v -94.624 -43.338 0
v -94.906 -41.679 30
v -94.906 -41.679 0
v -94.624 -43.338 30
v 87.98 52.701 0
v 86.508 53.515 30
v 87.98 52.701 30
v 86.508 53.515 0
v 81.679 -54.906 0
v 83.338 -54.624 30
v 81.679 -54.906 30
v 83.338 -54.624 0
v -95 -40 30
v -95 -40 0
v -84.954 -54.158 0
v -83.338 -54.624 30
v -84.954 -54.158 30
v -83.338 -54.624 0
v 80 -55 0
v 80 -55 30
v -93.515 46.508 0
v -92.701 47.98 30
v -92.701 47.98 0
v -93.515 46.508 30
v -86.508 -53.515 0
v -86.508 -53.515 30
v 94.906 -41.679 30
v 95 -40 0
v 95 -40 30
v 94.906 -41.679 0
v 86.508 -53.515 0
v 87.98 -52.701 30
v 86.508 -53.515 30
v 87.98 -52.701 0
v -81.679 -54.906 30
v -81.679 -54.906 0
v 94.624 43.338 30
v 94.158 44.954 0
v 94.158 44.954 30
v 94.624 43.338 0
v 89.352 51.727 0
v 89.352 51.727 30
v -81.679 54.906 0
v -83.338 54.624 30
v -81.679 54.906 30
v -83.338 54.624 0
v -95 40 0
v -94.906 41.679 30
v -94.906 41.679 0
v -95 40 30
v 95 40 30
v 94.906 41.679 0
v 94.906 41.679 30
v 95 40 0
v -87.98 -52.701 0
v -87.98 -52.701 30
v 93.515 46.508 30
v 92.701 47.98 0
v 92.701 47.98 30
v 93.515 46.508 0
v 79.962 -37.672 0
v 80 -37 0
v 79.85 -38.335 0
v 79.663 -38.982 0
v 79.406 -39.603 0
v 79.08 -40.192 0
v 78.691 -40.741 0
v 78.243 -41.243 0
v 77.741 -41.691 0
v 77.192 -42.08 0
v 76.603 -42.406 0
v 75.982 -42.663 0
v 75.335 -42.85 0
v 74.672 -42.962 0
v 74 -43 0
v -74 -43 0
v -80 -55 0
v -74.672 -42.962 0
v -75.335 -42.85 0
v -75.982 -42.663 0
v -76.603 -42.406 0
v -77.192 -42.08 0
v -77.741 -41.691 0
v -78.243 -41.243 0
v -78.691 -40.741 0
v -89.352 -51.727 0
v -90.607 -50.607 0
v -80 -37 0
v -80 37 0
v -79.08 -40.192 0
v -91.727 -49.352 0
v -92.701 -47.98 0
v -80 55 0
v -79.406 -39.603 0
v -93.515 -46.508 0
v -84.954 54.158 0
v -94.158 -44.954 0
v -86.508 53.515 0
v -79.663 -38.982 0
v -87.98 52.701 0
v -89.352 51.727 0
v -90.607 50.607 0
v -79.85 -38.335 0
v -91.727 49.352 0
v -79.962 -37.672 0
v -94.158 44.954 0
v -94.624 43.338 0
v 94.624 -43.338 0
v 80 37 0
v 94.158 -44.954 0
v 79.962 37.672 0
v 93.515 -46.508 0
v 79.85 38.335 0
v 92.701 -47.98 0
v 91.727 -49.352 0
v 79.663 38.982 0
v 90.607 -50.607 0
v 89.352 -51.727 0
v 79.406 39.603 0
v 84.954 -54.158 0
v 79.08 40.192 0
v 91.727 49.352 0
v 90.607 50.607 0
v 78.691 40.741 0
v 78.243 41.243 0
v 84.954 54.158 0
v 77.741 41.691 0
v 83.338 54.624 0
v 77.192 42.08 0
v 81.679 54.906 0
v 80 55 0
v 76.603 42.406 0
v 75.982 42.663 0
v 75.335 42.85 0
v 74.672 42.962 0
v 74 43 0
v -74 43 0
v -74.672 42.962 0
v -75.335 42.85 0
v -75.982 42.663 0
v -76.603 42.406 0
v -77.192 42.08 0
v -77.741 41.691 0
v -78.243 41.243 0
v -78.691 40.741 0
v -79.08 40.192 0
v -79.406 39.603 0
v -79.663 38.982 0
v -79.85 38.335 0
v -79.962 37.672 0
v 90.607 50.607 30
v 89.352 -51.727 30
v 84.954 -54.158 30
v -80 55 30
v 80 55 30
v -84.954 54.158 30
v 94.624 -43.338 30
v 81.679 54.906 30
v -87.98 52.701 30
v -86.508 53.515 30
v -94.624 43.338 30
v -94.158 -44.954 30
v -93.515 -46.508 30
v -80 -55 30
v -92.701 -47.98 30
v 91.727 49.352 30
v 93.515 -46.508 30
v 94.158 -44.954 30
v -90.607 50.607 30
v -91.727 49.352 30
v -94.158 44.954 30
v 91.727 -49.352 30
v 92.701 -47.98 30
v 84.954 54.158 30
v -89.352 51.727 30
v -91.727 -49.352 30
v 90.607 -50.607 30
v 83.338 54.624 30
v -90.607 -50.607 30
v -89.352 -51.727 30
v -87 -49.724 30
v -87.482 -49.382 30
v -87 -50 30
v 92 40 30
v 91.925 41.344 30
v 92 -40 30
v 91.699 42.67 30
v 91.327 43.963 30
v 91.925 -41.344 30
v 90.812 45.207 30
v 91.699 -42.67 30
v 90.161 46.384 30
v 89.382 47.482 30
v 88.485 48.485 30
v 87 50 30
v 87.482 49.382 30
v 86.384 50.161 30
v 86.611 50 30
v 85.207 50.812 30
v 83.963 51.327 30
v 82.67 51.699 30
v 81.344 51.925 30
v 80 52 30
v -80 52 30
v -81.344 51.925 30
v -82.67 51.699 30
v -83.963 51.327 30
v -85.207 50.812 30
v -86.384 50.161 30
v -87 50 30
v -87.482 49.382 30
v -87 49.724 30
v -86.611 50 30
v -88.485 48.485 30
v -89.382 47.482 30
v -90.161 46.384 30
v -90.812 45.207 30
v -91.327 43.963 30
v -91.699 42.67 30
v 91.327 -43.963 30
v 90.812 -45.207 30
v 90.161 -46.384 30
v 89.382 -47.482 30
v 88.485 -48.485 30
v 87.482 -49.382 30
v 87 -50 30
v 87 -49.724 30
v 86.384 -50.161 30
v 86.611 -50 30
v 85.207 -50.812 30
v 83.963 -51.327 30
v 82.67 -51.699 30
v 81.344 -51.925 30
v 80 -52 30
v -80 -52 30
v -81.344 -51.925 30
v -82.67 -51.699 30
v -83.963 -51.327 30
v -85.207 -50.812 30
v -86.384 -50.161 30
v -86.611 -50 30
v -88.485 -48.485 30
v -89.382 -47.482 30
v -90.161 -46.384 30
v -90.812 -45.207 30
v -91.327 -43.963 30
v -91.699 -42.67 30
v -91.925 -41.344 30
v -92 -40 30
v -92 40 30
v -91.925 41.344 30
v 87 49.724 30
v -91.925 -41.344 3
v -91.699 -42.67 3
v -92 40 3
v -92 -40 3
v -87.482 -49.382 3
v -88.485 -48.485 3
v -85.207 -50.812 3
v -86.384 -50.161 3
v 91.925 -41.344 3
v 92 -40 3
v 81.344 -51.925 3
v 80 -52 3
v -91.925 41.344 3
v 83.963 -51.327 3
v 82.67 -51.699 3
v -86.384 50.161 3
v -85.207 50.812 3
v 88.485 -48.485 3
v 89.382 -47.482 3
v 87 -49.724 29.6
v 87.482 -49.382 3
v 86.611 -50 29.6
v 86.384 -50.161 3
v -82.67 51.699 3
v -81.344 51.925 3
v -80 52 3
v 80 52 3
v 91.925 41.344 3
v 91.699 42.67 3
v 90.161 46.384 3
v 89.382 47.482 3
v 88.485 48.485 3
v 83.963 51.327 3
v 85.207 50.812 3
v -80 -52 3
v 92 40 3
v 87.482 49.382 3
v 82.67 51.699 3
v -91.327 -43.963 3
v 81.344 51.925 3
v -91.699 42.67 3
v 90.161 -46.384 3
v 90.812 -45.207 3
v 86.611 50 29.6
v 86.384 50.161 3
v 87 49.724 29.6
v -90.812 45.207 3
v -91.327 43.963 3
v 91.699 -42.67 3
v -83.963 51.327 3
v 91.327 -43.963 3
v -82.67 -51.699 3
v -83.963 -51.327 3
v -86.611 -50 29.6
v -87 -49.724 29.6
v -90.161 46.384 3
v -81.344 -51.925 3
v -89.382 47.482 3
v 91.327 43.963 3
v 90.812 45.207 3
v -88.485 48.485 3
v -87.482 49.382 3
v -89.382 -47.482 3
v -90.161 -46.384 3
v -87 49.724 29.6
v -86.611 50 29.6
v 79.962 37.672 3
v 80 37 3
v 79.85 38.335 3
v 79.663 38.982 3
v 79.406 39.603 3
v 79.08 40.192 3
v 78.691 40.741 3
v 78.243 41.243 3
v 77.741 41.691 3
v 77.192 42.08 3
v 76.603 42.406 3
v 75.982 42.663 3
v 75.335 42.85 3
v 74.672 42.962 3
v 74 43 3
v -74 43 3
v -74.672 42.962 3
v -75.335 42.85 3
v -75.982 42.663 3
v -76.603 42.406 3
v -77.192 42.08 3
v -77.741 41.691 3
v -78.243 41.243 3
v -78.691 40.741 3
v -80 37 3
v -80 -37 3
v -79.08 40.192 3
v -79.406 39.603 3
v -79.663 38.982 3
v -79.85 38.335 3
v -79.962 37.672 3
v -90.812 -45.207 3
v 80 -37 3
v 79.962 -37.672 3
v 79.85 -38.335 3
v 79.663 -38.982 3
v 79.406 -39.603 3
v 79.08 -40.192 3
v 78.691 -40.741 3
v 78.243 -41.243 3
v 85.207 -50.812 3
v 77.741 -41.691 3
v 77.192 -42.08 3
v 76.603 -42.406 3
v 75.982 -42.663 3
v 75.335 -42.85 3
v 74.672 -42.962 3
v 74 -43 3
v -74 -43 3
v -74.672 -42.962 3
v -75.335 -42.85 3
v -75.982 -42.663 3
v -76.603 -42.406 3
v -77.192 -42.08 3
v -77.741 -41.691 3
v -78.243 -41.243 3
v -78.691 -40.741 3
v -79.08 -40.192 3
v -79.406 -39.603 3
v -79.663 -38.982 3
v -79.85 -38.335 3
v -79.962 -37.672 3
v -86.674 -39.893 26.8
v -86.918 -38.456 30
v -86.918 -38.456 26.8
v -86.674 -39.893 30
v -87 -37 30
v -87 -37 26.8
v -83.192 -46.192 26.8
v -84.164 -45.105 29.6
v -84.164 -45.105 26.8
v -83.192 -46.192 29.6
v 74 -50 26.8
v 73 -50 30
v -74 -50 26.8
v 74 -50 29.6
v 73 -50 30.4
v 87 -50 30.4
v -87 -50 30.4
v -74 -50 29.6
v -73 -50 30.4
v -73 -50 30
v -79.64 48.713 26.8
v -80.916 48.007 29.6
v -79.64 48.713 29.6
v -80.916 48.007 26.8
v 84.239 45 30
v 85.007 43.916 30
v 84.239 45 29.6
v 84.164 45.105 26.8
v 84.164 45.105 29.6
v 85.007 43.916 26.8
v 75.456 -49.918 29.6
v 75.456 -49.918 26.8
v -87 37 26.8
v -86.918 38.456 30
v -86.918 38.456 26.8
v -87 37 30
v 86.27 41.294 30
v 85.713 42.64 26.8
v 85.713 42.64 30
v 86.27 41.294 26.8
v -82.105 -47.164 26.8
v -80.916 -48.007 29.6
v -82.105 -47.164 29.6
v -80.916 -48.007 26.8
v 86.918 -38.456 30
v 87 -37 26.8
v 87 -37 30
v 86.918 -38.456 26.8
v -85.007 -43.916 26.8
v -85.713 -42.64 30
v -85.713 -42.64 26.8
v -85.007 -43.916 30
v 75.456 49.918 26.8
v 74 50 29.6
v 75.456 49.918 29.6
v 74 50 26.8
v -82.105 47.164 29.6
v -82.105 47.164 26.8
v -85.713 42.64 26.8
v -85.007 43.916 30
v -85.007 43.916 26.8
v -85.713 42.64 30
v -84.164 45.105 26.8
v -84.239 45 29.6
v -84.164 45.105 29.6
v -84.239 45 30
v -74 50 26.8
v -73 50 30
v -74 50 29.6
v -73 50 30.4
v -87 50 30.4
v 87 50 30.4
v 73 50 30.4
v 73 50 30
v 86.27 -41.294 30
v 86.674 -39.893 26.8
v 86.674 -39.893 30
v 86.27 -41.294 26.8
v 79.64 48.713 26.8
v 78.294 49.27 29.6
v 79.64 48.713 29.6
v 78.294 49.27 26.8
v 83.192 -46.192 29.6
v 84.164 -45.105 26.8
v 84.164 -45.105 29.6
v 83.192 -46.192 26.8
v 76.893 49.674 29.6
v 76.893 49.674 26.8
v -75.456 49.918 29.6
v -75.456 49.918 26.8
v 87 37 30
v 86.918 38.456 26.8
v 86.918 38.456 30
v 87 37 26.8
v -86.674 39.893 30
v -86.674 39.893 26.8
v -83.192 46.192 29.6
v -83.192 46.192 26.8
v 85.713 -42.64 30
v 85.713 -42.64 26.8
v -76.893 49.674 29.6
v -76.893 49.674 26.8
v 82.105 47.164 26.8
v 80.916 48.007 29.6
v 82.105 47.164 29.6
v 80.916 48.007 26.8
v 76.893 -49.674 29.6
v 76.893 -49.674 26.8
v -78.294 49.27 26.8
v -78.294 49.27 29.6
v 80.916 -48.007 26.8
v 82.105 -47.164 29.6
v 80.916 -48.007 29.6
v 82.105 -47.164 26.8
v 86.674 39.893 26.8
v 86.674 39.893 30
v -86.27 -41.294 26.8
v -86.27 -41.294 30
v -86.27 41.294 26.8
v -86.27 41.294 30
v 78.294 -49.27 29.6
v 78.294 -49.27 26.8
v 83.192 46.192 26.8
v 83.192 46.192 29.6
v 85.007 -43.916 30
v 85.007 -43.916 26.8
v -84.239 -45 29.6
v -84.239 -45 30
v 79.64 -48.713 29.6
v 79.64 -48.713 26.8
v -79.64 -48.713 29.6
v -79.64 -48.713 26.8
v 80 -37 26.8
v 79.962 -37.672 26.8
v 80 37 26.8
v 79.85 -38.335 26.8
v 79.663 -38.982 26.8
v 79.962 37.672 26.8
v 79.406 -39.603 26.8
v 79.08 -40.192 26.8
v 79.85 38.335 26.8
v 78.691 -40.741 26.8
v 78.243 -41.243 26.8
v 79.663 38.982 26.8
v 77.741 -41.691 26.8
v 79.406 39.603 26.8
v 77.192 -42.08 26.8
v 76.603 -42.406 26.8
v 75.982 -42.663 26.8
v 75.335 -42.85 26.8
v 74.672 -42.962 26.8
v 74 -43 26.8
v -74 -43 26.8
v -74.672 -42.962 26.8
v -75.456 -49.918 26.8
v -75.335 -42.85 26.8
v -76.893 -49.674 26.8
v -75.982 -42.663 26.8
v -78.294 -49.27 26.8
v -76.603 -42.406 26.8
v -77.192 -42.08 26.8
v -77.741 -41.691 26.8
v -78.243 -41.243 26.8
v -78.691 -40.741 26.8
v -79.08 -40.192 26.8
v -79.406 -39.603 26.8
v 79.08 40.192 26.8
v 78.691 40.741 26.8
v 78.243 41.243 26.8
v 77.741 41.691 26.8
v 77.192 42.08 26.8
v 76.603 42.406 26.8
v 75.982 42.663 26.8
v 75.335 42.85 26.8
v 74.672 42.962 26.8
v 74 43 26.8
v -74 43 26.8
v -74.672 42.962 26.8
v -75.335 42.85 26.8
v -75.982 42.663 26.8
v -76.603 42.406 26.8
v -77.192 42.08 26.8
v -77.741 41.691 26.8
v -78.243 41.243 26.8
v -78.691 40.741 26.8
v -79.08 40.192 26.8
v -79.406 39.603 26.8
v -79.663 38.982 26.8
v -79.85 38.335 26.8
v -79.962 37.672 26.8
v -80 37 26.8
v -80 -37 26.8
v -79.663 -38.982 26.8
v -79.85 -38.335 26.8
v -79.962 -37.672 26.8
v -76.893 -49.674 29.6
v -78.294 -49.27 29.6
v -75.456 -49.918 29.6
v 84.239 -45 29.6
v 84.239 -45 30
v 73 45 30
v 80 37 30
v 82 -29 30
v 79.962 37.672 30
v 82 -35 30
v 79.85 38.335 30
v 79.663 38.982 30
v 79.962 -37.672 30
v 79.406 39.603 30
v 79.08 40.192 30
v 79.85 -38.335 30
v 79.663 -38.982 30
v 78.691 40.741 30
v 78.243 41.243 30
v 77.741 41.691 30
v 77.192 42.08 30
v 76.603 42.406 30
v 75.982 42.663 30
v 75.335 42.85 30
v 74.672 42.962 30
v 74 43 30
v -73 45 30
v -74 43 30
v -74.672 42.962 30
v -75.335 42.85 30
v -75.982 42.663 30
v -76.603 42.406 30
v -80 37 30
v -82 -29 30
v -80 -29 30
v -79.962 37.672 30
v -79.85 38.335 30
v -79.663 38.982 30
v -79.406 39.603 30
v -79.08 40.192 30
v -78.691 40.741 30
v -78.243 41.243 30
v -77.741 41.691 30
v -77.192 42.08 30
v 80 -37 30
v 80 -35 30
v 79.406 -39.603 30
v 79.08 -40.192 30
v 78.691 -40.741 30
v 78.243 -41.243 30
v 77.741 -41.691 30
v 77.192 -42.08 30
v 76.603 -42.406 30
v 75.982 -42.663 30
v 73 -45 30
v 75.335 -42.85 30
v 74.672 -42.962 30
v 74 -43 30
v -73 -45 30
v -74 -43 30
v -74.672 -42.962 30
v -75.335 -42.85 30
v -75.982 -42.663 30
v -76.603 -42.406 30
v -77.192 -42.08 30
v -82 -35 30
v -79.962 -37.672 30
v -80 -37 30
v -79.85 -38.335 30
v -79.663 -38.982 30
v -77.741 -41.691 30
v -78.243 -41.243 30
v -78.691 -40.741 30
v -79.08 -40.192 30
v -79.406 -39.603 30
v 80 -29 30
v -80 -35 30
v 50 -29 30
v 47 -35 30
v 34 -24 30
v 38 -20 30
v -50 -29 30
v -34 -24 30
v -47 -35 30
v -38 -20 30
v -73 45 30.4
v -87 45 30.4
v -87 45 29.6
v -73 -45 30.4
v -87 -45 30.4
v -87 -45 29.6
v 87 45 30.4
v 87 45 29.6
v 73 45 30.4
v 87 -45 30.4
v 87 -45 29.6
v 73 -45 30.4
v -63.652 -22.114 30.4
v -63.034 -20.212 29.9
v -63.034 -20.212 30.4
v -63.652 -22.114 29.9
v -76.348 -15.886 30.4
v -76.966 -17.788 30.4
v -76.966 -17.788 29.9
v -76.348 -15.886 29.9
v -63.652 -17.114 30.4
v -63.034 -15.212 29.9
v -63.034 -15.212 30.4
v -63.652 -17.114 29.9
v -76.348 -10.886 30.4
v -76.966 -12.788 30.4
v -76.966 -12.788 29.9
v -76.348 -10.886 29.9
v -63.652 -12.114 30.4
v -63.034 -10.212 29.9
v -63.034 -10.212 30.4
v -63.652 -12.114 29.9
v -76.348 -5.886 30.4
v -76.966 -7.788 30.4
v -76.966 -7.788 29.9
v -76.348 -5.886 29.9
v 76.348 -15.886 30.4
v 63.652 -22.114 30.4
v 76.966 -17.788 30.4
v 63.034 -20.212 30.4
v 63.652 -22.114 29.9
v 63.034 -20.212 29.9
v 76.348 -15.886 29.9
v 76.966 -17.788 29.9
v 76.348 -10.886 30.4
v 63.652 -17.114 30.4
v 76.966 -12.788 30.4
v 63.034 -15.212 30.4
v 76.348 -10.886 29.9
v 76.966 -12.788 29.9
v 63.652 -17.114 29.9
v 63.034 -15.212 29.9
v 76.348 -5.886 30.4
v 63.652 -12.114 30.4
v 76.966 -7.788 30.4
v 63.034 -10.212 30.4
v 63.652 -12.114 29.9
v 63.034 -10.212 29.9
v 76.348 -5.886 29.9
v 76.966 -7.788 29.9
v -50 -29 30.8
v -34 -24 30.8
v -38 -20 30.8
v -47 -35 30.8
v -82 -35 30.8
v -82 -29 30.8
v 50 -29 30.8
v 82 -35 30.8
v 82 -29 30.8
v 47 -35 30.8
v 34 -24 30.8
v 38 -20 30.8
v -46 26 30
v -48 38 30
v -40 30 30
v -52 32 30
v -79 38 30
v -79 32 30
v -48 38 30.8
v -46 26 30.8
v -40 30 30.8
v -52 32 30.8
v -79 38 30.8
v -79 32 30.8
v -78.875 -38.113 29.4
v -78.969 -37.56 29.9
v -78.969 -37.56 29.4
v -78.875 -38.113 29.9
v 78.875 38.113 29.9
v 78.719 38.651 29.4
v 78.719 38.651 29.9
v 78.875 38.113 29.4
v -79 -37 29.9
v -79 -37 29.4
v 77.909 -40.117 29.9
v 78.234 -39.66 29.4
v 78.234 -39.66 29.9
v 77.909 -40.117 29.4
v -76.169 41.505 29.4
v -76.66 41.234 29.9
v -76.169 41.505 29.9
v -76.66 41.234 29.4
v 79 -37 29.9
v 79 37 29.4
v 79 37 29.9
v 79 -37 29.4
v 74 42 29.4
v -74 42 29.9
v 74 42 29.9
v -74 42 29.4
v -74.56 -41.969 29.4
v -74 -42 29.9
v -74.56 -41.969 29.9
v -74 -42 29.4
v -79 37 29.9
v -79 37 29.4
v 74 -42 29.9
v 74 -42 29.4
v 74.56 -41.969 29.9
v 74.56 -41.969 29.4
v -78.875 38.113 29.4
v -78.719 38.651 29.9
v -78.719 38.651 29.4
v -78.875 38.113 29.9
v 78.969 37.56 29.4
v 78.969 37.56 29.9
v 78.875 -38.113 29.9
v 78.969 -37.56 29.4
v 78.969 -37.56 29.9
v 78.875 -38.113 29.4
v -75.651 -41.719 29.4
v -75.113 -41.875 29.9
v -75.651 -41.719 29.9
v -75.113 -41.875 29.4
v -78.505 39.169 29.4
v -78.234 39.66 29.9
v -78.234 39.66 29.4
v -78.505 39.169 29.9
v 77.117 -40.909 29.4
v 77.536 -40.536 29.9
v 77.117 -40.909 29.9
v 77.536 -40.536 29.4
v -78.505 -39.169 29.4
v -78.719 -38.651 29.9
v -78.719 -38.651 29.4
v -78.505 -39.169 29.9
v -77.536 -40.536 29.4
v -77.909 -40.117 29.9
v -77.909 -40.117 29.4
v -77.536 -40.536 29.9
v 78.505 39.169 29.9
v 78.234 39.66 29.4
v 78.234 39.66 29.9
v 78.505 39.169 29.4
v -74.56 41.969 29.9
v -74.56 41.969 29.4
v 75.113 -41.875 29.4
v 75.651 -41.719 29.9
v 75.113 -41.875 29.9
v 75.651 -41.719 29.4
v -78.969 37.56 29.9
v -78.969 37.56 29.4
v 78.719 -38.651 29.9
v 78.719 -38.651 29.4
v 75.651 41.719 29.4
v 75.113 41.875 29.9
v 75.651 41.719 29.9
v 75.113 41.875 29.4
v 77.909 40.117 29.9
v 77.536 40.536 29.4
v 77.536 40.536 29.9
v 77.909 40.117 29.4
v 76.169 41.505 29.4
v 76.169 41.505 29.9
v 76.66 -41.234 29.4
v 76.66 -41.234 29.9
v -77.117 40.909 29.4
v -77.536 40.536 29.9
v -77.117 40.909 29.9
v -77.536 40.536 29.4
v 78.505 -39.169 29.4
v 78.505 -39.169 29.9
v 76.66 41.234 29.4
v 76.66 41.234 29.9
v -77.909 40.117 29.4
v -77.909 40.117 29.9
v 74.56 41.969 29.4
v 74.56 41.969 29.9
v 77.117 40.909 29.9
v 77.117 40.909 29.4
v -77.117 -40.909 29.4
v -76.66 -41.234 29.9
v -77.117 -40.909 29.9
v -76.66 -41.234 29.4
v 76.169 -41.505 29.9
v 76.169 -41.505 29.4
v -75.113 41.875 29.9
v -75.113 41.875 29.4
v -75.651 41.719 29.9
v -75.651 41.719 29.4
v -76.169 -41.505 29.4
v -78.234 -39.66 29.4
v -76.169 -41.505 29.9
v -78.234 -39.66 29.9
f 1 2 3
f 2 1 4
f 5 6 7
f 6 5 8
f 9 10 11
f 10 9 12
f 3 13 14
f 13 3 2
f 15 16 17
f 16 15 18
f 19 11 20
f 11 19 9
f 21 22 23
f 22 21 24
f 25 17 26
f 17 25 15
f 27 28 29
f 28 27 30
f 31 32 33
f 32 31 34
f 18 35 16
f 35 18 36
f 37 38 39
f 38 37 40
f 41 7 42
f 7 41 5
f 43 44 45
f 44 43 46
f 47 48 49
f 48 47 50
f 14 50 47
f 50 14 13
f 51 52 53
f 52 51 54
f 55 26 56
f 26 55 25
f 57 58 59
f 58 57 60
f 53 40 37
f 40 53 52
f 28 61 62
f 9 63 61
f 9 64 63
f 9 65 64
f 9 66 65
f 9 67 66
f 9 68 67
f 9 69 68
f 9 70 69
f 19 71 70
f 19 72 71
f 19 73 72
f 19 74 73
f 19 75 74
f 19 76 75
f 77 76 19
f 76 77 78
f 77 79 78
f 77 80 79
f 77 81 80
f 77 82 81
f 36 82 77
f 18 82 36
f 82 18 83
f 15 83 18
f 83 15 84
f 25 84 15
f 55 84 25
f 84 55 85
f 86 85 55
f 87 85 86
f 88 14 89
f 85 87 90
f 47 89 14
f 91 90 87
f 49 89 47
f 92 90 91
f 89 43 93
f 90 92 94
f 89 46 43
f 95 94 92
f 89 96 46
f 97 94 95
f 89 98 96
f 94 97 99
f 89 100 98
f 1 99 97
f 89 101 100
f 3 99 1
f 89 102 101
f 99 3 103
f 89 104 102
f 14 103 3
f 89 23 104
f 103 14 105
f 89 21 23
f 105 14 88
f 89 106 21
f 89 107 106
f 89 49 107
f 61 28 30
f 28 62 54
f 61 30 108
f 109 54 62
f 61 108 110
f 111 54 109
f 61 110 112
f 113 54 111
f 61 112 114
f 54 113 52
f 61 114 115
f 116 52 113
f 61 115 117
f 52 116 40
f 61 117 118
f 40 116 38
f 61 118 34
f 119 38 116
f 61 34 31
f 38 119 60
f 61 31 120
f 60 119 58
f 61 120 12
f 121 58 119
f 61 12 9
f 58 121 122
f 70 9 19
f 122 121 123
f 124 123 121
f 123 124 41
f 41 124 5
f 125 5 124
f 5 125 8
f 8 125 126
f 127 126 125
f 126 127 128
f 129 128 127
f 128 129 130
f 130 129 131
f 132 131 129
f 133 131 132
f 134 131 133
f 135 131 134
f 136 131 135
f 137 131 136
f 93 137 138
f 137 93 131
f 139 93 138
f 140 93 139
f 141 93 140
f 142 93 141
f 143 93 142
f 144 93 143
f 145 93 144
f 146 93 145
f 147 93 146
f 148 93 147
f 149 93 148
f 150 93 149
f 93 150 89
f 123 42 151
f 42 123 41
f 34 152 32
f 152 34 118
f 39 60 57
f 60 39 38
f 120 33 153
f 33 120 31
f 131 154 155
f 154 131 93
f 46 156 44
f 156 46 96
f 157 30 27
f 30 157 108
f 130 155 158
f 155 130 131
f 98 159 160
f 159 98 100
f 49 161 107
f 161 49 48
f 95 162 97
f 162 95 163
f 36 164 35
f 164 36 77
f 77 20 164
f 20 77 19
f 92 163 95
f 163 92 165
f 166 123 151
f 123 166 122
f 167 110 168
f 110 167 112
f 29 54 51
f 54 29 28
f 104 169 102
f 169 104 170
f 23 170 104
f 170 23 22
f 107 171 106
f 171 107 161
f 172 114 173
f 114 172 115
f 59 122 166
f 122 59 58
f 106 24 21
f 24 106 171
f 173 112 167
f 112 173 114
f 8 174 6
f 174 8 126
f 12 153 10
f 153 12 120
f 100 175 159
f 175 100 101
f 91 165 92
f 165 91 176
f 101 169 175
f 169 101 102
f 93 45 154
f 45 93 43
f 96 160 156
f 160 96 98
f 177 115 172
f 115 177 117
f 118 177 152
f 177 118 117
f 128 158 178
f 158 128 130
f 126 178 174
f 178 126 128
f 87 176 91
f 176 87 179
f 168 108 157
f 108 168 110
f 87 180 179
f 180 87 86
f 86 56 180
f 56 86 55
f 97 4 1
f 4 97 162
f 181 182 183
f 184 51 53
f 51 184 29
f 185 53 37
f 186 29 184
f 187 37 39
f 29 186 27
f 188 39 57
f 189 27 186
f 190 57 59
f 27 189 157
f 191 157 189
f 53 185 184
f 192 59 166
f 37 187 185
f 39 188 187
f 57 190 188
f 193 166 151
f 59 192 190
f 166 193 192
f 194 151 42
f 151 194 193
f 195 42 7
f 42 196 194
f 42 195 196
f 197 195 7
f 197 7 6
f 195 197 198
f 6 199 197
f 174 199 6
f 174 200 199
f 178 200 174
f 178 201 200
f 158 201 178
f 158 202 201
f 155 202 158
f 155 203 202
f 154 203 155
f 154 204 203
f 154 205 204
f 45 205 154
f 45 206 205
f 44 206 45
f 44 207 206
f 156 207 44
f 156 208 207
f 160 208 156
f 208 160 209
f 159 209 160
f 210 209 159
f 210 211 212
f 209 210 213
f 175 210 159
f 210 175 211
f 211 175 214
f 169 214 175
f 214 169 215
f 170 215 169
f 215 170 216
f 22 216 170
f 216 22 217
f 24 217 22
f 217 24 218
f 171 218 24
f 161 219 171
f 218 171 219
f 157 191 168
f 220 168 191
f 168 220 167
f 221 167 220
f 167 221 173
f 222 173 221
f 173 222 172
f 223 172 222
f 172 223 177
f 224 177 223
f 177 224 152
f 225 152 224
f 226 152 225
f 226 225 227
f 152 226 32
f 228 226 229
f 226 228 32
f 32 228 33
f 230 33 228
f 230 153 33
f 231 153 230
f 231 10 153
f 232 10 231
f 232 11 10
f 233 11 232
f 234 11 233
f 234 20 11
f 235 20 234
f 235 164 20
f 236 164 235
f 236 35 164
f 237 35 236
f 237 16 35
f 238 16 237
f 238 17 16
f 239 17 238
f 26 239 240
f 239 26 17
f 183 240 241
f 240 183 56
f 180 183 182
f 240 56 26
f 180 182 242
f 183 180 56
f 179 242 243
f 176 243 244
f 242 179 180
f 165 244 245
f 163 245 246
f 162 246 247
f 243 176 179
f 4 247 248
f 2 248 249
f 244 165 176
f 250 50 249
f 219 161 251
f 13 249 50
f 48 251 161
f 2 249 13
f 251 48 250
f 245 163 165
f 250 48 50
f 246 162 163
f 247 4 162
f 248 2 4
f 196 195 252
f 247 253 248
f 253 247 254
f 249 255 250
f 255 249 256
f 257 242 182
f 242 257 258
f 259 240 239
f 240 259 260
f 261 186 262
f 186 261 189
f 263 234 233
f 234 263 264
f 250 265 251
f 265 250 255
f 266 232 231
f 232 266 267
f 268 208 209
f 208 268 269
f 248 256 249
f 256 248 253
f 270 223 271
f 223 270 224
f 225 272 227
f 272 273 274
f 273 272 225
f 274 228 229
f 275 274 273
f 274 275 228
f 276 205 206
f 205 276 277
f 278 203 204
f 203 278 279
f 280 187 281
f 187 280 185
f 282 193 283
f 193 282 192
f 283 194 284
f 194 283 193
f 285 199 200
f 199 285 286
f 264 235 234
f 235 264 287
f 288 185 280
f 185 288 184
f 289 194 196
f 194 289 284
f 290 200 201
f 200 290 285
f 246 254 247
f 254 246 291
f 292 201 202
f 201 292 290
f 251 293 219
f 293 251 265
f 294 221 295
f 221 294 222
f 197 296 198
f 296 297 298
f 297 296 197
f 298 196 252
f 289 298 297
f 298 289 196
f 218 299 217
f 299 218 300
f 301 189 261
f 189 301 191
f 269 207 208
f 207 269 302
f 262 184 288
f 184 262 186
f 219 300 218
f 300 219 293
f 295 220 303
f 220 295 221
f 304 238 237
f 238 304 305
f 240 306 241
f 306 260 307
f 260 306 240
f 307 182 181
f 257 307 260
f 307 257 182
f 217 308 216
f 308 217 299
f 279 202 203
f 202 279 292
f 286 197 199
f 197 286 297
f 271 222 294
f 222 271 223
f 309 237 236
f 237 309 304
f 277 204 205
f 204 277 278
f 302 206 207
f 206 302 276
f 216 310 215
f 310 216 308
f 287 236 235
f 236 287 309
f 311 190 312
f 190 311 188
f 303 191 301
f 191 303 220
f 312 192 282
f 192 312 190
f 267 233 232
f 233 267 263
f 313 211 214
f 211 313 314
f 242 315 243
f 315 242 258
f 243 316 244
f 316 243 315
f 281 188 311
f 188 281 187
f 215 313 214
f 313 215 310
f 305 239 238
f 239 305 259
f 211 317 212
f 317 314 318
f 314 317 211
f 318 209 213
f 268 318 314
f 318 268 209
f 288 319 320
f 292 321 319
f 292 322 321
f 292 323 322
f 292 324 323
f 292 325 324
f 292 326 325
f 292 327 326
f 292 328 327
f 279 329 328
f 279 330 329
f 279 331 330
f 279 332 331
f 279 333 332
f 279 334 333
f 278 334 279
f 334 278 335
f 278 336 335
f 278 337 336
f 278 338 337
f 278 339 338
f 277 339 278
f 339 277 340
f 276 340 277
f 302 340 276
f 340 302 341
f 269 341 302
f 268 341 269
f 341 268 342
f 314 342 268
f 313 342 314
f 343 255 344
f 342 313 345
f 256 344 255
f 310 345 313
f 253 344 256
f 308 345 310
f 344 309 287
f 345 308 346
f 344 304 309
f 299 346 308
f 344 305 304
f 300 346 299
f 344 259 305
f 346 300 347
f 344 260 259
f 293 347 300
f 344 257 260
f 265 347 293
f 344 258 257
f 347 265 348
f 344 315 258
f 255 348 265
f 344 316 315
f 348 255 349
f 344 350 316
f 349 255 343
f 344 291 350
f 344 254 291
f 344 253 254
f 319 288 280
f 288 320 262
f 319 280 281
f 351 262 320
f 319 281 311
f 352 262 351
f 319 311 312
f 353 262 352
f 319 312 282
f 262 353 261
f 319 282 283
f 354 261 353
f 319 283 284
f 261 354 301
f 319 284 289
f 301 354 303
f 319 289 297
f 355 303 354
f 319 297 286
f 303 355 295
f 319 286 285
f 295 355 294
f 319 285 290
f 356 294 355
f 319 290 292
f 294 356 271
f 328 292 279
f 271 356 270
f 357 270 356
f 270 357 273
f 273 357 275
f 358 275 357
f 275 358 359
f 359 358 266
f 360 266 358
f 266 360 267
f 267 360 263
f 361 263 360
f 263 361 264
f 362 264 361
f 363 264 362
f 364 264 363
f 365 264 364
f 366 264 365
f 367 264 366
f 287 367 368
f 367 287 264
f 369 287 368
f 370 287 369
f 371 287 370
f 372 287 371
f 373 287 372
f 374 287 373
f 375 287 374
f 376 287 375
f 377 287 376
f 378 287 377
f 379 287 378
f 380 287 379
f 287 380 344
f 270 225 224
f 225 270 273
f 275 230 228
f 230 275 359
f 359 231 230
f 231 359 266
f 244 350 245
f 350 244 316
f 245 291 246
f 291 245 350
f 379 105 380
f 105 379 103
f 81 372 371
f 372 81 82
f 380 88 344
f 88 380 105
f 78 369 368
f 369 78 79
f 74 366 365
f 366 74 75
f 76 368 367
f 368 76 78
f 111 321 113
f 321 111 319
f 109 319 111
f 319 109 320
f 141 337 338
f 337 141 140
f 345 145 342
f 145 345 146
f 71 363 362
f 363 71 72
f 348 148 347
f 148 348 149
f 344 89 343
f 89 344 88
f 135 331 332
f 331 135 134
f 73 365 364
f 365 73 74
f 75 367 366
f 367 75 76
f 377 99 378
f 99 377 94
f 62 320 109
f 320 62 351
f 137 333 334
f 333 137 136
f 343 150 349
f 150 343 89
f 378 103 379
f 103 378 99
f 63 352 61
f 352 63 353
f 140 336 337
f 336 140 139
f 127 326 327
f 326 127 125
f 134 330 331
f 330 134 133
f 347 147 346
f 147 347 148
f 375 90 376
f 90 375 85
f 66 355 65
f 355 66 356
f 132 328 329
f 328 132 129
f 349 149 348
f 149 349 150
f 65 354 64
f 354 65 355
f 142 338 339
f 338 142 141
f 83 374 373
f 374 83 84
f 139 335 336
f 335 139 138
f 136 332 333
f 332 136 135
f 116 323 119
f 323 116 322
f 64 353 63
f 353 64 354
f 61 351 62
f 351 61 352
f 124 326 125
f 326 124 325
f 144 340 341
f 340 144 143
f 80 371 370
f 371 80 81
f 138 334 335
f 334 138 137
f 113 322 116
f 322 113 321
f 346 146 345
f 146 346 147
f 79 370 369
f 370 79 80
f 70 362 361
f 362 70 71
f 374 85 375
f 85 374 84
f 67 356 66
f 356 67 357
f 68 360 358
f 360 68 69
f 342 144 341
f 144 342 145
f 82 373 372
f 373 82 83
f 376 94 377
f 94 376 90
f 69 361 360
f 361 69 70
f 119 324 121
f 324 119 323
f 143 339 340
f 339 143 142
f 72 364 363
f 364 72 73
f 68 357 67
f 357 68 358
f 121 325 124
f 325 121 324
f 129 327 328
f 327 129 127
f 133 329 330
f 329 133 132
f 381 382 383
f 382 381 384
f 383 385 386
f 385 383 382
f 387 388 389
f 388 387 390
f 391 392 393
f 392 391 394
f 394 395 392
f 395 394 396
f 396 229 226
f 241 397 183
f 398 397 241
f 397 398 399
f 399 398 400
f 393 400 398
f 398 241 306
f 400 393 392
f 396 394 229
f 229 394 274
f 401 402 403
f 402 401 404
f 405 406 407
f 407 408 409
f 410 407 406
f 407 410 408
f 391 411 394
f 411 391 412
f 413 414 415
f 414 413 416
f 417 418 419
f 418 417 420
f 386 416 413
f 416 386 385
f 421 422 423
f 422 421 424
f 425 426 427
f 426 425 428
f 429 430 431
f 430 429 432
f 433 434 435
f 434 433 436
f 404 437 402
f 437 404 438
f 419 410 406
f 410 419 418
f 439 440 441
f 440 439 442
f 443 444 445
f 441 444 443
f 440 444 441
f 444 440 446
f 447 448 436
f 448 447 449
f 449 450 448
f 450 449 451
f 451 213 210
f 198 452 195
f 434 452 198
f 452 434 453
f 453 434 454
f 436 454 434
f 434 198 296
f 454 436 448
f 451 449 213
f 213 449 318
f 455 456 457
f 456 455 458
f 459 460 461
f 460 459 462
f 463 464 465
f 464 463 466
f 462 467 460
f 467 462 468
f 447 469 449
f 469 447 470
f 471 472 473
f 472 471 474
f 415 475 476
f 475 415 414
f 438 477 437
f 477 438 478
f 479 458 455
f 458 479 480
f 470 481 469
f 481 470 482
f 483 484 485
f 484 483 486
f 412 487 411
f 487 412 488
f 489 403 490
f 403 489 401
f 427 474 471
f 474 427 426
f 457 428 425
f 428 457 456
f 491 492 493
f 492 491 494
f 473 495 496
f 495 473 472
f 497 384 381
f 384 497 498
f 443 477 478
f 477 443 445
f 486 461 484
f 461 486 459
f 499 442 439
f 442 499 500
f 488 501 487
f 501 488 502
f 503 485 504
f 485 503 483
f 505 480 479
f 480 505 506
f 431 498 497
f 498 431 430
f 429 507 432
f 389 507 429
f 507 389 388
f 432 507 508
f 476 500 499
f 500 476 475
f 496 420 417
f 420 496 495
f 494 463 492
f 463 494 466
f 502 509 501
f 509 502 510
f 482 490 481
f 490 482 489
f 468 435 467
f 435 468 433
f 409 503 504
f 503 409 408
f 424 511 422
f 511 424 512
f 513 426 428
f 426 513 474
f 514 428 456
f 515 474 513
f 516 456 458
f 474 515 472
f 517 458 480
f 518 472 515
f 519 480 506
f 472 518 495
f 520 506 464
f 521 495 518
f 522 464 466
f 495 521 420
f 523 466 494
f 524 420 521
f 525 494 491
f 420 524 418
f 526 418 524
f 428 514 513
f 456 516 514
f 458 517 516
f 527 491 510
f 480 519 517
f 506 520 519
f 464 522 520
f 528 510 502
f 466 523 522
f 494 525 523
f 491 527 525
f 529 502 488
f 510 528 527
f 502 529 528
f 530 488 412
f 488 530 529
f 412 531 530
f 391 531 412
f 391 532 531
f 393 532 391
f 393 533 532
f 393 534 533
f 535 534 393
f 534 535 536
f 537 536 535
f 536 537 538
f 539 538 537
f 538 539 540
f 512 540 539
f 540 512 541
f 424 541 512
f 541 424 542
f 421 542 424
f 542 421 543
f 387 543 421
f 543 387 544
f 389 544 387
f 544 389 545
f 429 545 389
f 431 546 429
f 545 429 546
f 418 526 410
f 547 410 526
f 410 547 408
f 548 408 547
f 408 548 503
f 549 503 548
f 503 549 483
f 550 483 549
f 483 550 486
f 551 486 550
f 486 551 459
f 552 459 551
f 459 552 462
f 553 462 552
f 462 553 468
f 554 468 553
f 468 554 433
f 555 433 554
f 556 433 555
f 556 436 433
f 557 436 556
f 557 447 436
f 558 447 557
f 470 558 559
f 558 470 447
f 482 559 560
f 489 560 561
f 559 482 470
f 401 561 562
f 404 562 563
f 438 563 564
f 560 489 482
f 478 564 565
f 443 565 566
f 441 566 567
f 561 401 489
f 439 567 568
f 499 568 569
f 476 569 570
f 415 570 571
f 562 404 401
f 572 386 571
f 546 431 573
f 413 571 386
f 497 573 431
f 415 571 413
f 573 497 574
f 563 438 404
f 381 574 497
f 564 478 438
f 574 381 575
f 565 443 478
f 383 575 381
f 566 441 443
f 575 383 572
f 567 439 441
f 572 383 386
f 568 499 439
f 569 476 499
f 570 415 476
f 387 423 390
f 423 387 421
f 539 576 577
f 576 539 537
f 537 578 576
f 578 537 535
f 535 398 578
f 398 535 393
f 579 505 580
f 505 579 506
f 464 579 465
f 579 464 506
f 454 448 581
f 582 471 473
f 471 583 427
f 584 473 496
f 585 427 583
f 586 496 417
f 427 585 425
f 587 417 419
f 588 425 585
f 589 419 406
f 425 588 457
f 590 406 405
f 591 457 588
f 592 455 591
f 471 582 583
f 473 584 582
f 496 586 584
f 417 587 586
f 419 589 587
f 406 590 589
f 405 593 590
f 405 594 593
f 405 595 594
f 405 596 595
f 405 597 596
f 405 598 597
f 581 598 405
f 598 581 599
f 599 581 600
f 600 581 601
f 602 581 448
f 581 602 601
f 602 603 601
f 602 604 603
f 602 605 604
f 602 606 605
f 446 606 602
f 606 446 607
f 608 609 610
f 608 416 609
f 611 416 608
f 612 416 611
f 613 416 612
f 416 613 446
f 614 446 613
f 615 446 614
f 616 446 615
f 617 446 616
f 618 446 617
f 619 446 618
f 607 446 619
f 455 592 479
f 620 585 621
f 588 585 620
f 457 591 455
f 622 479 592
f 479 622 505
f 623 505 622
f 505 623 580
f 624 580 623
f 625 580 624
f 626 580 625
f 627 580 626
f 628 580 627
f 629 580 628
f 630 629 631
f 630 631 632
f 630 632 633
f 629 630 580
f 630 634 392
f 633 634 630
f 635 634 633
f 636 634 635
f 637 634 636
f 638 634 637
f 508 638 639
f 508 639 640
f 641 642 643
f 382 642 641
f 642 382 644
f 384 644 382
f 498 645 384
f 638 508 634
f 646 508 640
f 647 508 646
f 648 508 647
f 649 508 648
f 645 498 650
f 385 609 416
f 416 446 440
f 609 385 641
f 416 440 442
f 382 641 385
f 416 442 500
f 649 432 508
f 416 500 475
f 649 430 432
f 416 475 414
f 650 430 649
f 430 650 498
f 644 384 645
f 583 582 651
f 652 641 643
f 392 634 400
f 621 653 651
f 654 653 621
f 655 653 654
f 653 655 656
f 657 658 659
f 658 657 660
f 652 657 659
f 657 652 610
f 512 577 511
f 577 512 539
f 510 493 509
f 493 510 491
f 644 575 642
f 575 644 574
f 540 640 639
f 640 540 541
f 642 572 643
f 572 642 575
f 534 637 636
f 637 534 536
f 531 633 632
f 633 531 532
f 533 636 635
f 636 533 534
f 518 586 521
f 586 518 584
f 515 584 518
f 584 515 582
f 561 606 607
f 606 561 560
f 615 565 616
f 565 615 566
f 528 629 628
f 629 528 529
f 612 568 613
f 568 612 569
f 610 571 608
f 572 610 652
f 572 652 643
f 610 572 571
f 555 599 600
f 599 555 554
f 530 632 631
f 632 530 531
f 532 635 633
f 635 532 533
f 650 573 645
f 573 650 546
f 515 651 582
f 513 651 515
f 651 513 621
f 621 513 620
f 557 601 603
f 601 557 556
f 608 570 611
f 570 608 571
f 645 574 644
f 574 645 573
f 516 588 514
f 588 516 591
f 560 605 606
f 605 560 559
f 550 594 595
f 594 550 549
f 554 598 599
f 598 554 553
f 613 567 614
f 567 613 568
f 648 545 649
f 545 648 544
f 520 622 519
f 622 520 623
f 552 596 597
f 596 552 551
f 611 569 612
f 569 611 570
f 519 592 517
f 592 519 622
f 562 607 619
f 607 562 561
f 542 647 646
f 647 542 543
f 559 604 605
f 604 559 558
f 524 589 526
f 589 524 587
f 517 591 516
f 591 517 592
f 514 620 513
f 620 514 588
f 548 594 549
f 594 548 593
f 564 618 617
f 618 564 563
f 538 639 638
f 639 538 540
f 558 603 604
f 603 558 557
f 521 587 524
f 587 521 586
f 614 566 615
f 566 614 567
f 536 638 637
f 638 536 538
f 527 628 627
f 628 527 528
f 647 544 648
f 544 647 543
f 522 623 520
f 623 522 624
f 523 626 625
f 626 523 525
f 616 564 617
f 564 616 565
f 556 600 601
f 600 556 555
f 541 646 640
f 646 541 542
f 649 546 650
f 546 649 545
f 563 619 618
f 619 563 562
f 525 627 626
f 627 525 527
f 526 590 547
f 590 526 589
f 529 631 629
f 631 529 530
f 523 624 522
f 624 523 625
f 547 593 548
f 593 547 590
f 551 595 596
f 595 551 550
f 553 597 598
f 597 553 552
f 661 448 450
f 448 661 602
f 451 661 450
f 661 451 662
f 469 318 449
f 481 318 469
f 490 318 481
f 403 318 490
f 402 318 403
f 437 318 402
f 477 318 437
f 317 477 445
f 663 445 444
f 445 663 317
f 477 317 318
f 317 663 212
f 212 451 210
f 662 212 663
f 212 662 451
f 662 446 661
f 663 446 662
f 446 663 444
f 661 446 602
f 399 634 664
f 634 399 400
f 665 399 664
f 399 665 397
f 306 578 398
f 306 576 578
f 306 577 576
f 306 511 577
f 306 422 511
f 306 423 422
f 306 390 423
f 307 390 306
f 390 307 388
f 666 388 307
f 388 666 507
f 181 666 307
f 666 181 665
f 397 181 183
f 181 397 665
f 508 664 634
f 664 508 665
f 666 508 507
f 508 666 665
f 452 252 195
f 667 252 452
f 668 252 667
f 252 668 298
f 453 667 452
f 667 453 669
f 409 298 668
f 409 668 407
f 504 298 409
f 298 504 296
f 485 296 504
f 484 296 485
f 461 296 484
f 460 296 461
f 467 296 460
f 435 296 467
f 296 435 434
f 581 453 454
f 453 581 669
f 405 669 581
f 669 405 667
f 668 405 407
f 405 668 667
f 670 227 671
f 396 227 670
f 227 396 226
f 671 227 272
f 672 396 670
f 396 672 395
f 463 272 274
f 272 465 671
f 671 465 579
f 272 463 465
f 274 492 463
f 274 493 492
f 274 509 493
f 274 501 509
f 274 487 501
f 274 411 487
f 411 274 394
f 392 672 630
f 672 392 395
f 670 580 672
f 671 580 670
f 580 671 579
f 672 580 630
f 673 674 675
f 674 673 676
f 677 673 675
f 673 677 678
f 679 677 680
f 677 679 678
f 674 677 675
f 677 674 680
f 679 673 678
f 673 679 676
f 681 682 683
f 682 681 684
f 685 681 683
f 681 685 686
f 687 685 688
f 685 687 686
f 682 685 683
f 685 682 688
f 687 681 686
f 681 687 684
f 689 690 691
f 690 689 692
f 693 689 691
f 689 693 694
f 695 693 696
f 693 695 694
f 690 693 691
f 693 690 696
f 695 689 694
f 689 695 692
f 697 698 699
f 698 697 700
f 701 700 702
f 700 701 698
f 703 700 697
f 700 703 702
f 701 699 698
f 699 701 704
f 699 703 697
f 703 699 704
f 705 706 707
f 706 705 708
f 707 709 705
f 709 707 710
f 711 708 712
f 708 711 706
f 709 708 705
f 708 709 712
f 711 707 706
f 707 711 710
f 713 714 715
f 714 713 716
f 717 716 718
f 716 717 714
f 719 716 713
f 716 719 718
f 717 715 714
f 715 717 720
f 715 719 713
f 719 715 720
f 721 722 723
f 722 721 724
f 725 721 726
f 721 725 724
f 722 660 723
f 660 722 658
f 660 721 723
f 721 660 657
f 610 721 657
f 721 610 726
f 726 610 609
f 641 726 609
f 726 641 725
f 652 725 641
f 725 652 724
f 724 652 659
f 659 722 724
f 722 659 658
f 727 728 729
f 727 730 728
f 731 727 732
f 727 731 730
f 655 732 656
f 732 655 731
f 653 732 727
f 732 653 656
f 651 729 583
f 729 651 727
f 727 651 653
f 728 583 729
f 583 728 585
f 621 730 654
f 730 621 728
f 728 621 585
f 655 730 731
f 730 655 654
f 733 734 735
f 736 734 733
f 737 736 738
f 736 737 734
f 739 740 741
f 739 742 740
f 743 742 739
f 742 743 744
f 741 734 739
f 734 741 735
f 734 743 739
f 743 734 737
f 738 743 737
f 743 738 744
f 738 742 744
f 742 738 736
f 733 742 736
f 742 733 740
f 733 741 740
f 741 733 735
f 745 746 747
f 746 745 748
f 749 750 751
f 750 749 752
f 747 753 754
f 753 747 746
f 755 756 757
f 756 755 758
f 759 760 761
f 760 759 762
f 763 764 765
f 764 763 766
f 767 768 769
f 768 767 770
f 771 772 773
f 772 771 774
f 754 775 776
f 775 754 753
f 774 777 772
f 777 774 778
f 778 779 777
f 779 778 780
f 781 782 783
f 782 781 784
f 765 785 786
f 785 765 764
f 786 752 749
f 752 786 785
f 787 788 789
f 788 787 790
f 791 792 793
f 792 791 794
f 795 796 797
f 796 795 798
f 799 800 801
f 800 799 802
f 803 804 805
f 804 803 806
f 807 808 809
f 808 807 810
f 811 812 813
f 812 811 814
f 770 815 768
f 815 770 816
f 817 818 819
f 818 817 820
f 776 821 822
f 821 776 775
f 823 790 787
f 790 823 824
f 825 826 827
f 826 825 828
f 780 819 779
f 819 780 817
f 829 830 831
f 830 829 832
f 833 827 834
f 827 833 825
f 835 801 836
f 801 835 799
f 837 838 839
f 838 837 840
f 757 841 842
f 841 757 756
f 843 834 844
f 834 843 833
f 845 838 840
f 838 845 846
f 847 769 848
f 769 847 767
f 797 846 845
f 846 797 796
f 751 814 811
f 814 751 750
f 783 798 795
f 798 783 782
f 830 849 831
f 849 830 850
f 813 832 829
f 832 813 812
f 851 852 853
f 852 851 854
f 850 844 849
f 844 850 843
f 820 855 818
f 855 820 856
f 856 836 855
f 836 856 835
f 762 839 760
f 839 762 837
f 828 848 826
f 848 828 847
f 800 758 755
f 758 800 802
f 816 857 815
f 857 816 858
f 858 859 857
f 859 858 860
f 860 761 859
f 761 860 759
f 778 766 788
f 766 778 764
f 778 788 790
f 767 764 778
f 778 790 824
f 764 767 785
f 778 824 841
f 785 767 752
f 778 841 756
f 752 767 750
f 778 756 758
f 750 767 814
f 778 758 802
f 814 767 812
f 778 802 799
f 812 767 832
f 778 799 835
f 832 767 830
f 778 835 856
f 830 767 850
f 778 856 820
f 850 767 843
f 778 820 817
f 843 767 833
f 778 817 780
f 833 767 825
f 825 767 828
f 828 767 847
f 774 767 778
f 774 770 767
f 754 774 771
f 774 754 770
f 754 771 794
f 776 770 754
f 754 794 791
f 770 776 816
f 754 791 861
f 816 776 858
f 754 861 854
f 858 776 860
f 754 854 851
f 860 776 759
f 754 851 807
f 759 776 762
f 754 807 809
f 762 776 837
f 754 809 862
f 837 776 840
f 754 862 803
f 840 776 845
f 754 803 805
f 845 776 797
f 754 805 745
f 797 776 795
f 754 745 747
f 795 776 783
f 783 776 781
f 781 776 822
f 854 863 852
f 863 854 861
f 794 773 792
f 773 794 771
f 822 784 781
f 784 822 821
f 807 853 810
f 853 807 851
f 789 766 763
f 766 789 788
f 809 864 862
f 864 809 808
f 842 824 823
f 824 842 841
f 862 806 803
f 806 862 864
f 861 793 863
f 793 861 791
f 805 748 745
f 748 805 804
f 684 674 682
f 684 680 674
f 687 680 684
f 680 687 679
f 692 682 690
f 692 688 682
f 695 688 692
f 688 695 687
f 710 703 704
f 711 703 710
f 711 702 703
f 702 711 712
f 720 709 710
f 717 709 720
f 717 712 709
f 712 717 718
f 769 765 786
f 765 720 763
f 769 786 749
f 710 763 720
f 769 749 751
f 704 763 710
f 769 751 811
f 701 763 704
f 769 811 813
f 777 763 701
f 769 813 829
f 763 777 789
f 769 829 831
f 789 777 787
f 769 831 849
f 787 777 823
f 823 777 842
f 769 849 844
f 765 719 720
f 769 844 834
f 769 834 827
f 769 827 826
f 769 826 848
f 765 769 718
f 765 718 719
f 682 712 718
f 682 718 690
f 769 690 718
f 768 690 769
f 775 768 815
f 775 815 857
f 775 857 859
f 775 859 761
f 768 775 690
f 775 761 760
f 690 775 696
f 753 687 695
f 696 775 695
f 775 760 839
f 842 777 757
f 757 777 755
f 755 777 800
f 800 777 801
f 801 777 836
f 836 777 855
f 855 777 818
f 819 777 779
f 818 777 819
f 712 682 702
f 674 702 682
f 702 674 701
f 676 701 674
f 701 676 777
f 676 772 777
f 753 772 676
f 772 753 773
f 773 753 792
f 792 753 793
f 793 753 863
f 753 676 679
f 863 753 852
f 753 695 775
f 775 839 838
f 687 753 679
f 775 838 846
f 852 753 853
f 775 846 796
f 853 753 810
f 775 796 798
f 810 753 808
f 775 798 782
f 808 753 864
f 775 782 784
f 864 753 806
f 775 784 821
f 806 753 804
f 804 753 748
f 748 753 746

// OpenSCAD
/*
  MotoMap — Cyberpunk front enclosure concept
  ------------------------------------------------
  Editable OpenSCAD starting point for a horizontal motorcycle display box.
  This file intentionally does NOT lock in the real screen, magnet, or clip
  dimensions. Edit the values in the PARAMETERS section before exporting STL.

  Suggested workflow:
    1. Open this file in OpenSCAD.
    2. Change outer dimensions and screen opening.
    3. Press F5 for preview, F6 to render, then export STL.
    4. Add the rear magnetic feet and right-side C/J clip after measuring the
       motorcycle reservoir screws and lamp stem.

  The generated object is a front-face concept, not a final road-safe mount.
*/

$fn = 56;

// ============================ PARAMETERS ============================

// Overall front housing. All units are millimetres.
box_w = 190;
box_h = 110;
box_d = 30;
corner_r = 15;
wall = 3;

// Generic 320 x 172 aspect-ratio display opening. Measure the real module.
screen_w = 160;
screen_h = 86;
screen_corner_r = 6;
bezel_w = 7;

// Cyberpunk visual relief.
faceplate_d = 3.2;
ridge_h = 0.8;
trace_w = 2.0;
accent_tab_w = 14;
accent_tab_h = 5;

// Visual switches.
show_shell = true;             // Basic rear-open body for reference.
show_cyberpunk_relief = true;  // Raised decorative traces and corner fins.
show_screen_placeholder = true;

// ============================== HELPERS =============================

module rounded_rect_2d(w, h, r) {
    rr = min(r, min(w, h) / 2);
    hull() {
        translate([-w/2 + rr, -h/2 + rr]) circle(r = rr);
        translate([ w/2 - rr, -h/2 + rr]) circle(r = rr);
        translate([ w/2 - rr,  h/2 - rr]) circle(r = rr);
        translate([-w/2 + rr,  h/2 - rr]) circle(r = rr);
    }
}

module rounded_prism(w, h, r, d) {
    linear_extrude(height = d) rounded_rect_2d(w, h, r);
}

module angled_trace(points, z = faceplate_d, height = ridge_h) {
    translate([0, 0, z]) linear_extrude(height = height) polygon(points);
}

module screen_window(d = faceplate_d + ridge_h + 1) {
    rounded_prism(screen_w, screen_h, screen_corner_r, d);
}

// ============================ BASE ENCLOSURE ========================

module rear_open_shell() {
    difference() {
        rounded_prism(box_w, box_h, corner_r, box_d);

        // Open rear cavity. This is deliberately plain so it is easy to alter.
        translate([0, 0, wall])
            rounded_prism(box_w - 2*wall, box_h - 2*wall,
                          max(2, corner_r - wall), box_d);

        // Window through the front.
        translate([0, 0, -1]) screen_window(box_d + 2);
    }
}

module front_bezel() {
    difference() {
        rounded_prism(screen_w + 2*bezel_w,
                      screen_h + 2*bezel_w,
                      screen_corner_r + bezel_w,
                      faceplate_d);
        translate([0, 0, -1]) screen_window(faceplate_d + 2);
    }
}

// ========================== CYBERPUNK DETAILS =======================

module left_lower_trace() {
    angled_trace([
        [-box_w/2 + 13, -box_h/2 + 20],
        [-box_w/2 + 48, -box_h/2 + 20],
        [-box_w/2 + 61, -box_h/2 + 31],
        [-box_w/2 + 57, -box_h/2 + 35],
        [-box_w/2 + 45, -box_h/2 + 26],
        [-box_w/2 + 13, -box_h/2 + 26]
    ]);
}

module right_lower_trace() {
    mirror([1, 0, 0]) left_lower_trace();
}

module upper_corner_fins() {
    angled_trace([
        [-box_w/2 + 16, box_h/2 - 17],
        [-box_w/2 + 47, box_h/2 - 17],
        [-box_w/2 + 55, box_h/2 - 25],
        [-box_w/2 + 49, box_h/2 - 29],
        [-box_w/2 + 43, box_h/2 - 23],
        [-box_w/2 + 16, box_h/2 - 23]
    ]);
    mirror([1, 0, 0]) children();
}

module bezel_side_accents() {
    // Four short raised tabs that can later be printed in a contrasting color.
    for (side = [-1, 1]) {
        translate([side * (screen_w/2 + bezel_w - accent_tab_w/2),
                   screen_h/2 + bezel_w - accent_tab_h/2,
                   faceplate_d])
            cube([accent_tab_w, accent_tab_h, ridge_h], center = true);
        translate([side * (screen_w/2 + bezel_w - accent_tab_w/2),
                   -screen_h/2 - bezel_w + accent_tab_h/2,
                   faceplate_d])
            cube([accent_tab_w, accent_tab_h, ridge_h], center = true);
    }
}

module lower_tech_vents() {
    // Decorative shallow bars only. Remove if the front needs to be watertight.
    for (side = [-1, 1]) {
        for (i = [0:2]) {
            translate([side * (box_w/2 - 25), -box_h/2 + 36 + i*5, faceplate_d])
                rotate([0, 0, side * 18])
                    cube([14, trace_w, ridge_h], center = true);
        }
    }
}

module cyberpunk_relief() {
    left_lower_trace();
    right_lower_trace();
    upper_corner_fins();
    bezel_side_accents();
    lower_tech_vents();
}

// =============================== ASSEMBLY ===========================

module motomap_front_concept() {
    if (show_shell) rear_open_shell();

    // The faceplate is placed on the front face of the shell.
    translate([0, 0, box_d - faceplate_d]) front_bezel();

    if (show_cyberpunk_relief) {
        translate([0, 0, box_d - faceplate_d]) cyberpunk_relief();
    }

    // Preview-only screen. Disable before exporting a printable shell.
    if (show_screen_placeholder) {
        color([0.05, 0.2, 0.28, 0.45])
            translate([0, 0, box_d - 0.6])
                rounded_prism(screen_w - 2, screen_h - 2,
                              max(1, screen_corner_r - 1), 0.5);
    }
}

motomap_front_concept();
